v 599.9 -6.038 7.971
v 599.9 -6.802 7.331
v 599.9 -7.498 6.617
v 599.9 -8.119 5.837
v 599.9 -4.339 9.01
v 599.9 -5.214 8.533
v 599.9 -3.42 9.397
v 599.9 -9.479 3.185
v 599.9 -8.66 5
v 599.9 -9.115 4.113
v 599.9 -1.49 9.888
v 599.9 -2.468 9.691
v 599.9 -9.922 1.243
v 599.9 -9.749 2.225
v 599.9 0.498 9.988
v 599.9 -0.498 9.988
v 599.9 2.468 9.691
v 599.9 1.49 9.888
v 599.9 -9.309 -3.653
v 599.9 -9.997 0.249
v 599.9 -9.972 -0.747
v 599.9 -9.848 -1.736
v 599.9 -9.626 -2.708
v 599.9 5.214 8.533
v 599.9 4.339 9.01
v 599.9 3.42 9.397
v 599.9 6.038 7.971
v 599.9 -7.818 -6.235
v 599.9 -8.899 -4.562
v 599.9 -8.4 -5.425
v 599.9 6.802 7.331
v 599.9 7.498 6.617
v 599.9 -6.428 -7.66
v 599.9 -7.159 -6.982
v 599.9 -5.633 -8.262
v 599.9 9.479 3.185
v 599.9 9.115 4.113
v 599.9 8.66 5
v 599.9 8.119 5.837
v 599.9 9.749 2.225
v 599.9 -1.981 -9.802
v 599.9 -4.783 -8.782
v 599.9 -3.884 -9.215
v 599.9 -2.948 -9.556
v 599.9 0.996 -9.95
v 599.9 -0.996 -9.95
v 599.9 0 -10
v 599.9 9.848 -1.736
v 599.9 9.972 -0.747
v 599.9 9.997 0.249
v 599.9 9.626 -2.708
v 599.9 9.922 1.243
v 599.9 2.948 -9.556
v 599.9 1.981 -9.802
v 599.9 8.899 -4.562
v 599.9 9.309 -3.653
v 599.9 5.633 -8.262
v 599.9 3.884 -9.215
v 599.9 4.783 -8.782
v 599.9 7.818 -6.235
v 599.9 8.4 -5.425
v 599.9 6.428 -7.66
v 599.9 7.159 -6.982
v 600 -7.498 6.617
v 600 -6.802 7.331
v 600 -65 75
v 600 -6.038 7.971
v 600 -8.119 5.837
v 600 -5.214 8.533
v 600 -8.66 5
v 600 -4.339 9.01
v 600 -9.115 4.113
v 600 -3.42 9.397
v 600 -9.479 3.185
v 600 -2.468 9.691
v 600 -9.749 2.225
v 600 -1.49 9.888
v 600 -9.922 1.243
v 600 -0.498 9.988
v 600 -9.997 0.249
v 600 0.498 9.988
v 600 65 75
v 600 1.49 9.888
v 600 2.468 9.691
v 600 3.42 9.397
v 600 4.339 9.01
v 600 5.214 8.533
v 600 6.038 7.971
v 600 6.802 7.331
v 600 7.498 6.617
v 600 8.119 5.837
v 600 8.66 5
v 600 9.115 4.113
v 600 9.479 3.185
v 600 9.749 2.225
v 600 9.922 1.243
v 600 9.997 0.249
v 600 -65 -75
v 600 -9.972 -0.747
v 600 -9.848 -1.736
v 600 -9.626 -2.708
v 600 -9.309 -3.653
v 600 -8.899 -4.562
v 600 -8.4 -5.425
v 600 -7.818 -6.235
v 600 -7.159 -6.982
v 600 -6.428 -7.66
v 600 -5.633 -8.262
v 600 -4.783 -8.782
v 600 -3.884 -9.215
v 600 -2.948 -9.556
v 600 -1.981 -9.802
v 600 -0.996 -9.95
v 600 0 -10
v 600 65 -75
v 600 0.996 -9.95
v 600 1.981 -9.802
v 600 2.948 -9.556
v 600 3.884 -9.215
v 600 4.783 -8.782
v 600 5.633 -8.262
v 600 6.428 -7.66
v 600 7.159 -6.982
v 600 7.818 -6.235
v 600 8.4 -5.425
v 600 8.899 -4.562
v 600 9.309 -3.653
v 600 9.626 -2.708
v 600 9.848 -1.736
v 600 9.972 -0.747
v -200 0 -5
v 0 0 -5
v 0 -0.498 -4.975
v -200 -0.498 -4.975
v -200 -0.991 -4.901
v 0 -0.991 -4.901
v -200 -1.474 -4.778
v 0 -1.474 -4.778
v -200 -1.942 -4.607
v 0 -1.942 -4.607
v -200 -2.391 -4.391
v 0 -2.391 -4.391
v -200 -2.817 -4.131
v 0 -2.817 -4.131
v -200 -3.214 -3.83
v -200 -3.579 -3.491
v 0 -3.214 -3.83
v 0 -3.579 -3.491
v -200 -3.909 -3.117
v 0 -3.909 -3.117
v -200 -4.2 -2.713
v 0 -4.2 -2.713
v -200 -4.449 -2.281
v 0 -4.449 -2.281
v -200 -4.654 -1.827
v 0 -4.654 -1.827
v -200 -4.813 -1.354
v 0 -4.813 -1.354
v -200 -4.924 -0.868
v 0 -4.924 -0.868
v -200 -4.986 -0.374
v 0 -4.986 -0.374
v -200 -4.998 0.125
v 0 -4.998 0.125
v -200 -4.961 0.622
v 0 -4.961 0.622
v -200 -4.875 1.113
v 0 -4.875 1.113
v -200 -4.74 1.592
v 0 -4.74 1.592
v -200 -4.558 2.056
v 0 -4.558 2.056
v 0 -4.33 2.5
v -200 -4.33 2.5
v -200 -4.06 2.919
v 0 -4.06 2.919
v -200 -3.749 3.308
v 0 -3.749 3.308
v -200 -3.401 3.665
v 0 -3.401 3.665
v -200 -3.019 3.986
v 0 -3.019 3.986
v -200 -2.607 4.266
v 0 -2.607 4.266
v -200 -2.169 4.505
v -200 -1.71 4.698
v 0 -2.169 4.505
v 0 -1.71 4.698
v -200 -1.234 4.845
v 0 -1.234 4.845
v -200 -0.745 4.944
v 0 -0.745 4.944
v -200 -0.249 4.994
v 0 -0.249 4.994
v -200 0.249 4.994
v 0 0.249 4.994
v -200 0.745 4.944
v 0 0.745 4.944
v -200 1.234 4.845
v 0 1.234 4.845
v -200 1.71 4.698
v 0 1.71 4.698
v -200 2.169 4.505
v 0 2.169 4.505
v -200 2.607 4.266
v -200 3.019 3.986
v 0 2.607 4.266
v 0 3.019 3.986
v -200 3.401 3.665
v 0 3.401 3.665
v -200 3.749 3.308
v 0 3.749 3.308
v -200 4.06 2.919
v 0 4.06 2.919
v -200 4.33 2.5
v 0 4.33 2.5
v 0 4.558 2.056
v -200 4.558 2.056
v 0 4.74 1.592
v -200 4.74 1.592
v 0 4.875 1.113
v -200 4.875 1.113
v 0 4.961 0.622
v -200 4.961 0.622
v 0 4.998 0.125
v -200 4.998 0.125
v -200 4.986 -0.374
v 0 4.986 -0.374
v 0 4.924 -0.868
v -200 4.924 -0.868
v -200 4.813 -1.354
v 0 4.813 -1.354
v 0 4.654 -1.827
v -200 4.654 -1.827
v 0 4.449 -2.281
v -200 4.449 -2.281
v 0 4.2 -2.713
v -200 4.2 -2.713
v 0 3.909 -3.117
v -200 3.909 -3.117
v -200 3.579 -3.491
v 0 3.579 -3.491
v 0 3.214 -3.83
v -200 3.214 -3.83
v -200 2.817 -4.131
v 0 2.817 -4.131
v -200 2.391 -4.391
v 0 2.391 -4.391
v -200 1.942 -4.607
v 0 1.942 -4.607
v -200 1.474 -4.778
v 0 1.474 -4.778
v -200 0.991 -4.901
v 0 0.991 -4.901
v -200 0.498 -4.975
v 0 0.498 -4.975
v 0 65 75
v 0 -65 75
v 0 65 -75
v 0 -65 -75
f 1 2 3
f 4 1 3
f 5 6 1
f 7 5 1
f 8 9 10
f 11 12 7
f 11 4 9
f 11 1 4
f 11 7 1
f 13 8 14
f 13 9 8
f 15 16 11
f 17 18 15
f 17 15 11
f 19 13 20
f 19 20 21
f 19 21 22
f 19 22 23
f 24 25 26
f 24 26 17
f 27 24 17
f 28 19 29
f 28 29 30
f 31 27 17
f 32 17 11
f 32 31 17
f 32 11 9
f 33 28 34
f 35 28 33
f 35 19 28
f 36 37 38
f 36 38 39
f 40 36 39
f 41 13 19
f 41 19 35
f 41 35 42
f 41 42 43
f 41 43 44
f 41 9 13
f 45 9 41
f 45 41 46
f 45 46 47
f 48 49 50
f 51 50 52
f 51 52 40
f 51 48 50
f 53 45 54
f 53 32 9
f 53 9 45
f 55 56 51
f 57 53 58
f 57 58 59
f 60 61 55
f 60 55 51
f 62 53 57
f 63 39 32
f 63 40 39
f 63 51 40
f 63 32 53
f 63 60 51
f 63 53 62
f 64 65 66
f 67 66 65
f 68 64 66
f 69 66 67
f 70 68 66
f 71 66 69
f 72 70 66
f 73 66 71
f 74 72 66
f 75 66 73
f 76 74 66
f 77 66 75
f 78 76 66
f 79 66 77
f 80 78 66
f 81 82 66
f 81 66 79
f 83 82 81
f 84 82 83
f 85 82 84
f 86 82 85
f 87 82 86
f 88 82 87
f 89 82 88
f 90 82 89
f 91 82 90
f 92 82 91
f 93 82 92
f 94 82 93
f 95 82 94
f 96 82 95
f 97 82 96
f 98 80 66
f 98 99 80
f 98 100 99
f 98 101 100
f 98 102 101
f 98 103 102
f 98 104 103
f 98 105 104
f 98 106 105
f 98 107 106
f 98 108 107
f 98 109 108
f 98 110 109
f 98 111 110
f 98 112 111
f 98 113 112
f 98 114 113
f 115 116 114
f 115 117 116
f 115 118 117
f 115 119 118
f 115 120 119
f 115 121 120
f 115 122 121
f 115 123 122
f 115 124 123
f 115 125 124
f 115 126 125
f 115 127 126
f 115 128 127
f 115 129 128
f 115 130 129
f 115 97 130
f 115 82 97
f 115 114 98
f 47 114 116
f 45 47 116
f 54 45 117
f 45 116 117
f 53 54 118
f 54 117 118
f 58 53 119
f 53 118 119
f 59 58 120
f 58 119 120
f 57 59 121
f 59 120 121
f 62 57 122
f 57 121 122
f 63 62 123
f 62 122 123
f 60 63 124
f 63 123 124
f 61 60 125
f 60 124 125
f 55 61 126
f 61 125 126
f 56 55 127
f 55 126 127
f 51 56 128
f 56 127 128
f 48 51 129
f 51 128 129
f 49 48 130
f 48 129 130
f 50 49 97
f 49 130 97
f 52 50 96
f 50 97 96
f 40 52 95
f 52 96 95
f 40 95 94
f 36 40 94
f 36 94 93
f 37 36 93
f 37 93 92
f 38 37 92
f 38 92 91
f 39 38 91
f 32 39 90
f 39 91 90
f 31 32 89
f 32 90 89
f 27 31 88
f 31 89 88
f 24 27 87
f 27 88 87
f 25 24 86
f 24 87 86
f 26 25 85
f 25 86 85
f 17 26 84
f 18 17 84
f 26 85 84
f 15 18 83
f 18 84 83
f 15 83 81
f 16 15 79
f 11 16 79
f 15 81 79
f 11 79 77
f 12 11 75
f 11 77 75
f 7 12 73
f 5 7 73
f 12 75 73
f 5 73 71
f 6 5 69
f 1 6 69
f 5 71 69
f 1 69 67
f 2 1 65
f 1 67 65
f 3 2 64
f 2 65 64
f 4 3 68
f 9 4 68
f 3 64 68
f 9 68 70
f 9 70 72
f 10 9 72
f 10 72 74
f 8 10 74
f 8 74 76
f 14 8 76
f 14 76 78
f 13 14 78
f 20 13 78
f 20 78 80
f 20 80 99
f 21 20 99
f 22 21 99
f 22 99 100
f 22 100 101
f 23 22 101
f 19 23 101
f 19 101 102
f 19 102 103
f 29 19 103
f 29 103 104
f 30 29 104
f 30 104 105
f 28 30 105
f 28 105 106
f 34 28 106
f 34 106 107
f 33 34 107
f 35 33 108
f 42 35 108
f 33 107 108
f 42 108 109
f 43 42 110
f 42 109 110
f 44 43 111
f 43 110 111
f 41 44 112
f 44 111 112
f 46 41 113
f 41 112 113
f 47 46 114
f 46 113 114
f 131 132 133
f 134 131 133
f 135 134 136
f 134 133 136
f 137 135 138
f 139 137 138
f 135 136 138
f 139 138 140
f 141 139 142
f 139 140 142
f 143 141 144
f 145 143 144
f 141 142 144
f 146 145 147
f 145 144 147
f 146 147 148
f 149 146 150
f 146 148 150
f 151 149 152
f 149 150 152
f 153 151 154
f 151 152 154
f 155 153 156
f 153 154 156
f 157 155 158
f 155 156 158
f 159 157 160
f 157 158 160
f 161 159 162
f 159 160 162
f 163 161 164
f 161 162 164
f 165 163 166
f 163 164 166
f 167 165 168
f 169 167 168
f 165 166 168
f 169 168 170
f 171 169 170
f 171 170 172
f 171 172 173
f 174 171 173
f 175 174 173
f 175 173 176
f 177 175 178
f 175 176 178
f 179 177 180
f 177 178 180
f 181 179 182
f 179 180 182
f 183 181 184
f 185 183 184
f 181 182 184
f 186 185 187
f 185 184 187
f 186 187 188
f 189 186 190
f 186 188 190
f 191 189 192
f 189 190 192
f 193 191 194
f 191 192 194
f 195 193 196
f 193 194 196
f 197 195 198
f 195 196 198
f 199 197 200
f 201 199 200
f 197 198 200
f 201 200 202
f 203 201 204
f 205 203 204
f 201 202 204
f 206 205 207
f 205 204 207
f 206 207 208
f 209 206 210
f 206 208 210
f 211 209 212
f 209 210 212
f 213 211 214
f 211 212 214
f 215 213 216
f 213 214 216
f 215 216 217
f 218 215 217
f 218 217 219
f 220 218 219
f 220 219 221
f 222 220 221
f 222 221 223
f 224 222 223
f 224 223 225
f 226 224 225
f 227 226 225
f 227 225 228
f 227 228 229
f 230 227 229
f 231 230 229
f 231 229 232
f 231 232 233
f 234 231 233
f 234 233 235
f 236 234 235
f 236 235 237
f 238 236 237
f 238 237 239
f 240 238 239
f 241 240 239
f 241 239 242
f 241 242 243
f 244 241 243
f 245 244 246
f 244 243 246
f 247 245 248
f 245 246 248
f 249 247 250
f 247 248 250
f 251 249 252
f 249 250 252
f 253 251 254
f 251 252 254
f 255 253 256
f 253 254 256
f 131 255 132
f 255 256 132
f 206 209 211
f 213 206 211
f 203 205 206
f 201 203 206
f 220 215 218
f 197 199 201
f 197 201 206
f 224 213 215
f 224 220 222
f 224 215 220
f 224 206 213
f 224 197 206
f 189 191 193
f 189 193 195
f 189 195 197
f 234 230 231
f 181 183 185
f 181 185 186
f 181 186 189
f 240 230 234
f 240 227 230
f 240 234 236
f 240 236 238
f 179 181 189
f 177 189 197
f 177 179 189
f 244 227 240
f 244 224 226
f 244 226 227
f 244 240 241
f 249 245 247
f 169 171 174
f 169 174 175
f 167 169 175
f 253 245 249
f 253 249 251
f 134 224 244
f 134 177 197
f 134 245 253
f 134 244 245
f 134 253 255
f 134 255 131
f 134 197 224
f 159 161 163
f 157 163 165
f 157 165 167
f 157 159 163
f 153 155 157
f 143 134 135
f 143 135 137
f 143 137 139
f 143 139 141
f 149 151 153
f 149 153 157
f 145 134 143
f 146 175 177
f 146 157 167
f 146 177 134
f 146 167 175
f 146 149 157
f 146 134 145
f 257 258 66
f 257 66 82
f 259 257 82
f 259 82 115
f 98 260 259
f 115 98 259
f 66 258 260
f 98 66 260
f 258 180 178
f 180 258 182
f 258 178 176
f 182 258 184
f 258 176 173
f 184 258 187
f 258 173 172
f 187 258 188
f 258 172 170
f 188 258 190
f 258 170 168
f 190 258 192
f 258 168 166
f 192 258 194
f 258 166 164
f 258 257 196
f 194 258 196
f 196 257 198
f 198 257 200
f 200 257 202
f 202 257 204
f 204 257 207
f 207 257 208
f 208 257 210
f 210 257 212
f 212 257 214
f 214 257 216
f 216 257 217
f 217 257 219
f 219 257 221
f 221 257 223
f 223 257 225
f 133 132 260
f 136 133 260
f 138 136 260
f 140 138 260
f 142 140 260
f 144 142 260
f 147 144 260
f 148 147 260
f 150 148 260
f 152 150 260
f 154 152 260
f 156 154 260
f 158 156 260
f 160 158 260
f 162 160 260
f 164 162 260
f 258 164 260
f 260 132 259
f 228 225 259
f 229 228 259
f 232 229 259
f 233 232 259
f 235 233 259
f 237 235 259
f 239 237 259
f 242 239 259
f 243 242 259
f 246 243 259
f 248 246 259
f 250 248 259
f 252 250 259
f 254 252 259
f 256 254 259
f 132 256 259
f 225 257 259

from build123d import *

# Parameters (mm, degrees)
SKETCH1_W           = 150
SKETCH1_H           = 130
BOSS_EXTRUDE1_DEPTH = 600
SKETCH2_R           = 5
BOSS_EXTRUDE2_DEPTH = 200
SKETCH3_R           = 10
CUT_EXTRUDE1_DEPTH  = 0.1


with BuildPart() as part:
    # Sketch1 → Boss-Extrude1 (new body)
    with BuildSketch(Plane(origin=(0, 0, 0), x_dir=(0, 0, -1), z_dir=(1, 0, 0))):
        Rectangle(SKETCH1_W, SKETCH1_H)
    extrude(amount=BOSS_EXTRUDE1_DEPTH)

    # Sketch2 → Boss-Extrude2 (add)
    with BuildSketch(Plane.ZY):
        Circle(SKETCH2_R)
    extrude(amount=BOSS_EXTRUDE2_DEPTH)

    # Sketch3 → Cut-Extrude1 (cut)
    with BuildSketch(Plane(origin=(600, 0, 0), x_dir=(0, 0, -1), z_dir=(1, 0, 0))):
        Circle(SKETCH3_R)
    extrude(amount=-CUT_EXTRUDE1_DEPTH, mode=Mode.SUBTRACT)


solid = part.part
